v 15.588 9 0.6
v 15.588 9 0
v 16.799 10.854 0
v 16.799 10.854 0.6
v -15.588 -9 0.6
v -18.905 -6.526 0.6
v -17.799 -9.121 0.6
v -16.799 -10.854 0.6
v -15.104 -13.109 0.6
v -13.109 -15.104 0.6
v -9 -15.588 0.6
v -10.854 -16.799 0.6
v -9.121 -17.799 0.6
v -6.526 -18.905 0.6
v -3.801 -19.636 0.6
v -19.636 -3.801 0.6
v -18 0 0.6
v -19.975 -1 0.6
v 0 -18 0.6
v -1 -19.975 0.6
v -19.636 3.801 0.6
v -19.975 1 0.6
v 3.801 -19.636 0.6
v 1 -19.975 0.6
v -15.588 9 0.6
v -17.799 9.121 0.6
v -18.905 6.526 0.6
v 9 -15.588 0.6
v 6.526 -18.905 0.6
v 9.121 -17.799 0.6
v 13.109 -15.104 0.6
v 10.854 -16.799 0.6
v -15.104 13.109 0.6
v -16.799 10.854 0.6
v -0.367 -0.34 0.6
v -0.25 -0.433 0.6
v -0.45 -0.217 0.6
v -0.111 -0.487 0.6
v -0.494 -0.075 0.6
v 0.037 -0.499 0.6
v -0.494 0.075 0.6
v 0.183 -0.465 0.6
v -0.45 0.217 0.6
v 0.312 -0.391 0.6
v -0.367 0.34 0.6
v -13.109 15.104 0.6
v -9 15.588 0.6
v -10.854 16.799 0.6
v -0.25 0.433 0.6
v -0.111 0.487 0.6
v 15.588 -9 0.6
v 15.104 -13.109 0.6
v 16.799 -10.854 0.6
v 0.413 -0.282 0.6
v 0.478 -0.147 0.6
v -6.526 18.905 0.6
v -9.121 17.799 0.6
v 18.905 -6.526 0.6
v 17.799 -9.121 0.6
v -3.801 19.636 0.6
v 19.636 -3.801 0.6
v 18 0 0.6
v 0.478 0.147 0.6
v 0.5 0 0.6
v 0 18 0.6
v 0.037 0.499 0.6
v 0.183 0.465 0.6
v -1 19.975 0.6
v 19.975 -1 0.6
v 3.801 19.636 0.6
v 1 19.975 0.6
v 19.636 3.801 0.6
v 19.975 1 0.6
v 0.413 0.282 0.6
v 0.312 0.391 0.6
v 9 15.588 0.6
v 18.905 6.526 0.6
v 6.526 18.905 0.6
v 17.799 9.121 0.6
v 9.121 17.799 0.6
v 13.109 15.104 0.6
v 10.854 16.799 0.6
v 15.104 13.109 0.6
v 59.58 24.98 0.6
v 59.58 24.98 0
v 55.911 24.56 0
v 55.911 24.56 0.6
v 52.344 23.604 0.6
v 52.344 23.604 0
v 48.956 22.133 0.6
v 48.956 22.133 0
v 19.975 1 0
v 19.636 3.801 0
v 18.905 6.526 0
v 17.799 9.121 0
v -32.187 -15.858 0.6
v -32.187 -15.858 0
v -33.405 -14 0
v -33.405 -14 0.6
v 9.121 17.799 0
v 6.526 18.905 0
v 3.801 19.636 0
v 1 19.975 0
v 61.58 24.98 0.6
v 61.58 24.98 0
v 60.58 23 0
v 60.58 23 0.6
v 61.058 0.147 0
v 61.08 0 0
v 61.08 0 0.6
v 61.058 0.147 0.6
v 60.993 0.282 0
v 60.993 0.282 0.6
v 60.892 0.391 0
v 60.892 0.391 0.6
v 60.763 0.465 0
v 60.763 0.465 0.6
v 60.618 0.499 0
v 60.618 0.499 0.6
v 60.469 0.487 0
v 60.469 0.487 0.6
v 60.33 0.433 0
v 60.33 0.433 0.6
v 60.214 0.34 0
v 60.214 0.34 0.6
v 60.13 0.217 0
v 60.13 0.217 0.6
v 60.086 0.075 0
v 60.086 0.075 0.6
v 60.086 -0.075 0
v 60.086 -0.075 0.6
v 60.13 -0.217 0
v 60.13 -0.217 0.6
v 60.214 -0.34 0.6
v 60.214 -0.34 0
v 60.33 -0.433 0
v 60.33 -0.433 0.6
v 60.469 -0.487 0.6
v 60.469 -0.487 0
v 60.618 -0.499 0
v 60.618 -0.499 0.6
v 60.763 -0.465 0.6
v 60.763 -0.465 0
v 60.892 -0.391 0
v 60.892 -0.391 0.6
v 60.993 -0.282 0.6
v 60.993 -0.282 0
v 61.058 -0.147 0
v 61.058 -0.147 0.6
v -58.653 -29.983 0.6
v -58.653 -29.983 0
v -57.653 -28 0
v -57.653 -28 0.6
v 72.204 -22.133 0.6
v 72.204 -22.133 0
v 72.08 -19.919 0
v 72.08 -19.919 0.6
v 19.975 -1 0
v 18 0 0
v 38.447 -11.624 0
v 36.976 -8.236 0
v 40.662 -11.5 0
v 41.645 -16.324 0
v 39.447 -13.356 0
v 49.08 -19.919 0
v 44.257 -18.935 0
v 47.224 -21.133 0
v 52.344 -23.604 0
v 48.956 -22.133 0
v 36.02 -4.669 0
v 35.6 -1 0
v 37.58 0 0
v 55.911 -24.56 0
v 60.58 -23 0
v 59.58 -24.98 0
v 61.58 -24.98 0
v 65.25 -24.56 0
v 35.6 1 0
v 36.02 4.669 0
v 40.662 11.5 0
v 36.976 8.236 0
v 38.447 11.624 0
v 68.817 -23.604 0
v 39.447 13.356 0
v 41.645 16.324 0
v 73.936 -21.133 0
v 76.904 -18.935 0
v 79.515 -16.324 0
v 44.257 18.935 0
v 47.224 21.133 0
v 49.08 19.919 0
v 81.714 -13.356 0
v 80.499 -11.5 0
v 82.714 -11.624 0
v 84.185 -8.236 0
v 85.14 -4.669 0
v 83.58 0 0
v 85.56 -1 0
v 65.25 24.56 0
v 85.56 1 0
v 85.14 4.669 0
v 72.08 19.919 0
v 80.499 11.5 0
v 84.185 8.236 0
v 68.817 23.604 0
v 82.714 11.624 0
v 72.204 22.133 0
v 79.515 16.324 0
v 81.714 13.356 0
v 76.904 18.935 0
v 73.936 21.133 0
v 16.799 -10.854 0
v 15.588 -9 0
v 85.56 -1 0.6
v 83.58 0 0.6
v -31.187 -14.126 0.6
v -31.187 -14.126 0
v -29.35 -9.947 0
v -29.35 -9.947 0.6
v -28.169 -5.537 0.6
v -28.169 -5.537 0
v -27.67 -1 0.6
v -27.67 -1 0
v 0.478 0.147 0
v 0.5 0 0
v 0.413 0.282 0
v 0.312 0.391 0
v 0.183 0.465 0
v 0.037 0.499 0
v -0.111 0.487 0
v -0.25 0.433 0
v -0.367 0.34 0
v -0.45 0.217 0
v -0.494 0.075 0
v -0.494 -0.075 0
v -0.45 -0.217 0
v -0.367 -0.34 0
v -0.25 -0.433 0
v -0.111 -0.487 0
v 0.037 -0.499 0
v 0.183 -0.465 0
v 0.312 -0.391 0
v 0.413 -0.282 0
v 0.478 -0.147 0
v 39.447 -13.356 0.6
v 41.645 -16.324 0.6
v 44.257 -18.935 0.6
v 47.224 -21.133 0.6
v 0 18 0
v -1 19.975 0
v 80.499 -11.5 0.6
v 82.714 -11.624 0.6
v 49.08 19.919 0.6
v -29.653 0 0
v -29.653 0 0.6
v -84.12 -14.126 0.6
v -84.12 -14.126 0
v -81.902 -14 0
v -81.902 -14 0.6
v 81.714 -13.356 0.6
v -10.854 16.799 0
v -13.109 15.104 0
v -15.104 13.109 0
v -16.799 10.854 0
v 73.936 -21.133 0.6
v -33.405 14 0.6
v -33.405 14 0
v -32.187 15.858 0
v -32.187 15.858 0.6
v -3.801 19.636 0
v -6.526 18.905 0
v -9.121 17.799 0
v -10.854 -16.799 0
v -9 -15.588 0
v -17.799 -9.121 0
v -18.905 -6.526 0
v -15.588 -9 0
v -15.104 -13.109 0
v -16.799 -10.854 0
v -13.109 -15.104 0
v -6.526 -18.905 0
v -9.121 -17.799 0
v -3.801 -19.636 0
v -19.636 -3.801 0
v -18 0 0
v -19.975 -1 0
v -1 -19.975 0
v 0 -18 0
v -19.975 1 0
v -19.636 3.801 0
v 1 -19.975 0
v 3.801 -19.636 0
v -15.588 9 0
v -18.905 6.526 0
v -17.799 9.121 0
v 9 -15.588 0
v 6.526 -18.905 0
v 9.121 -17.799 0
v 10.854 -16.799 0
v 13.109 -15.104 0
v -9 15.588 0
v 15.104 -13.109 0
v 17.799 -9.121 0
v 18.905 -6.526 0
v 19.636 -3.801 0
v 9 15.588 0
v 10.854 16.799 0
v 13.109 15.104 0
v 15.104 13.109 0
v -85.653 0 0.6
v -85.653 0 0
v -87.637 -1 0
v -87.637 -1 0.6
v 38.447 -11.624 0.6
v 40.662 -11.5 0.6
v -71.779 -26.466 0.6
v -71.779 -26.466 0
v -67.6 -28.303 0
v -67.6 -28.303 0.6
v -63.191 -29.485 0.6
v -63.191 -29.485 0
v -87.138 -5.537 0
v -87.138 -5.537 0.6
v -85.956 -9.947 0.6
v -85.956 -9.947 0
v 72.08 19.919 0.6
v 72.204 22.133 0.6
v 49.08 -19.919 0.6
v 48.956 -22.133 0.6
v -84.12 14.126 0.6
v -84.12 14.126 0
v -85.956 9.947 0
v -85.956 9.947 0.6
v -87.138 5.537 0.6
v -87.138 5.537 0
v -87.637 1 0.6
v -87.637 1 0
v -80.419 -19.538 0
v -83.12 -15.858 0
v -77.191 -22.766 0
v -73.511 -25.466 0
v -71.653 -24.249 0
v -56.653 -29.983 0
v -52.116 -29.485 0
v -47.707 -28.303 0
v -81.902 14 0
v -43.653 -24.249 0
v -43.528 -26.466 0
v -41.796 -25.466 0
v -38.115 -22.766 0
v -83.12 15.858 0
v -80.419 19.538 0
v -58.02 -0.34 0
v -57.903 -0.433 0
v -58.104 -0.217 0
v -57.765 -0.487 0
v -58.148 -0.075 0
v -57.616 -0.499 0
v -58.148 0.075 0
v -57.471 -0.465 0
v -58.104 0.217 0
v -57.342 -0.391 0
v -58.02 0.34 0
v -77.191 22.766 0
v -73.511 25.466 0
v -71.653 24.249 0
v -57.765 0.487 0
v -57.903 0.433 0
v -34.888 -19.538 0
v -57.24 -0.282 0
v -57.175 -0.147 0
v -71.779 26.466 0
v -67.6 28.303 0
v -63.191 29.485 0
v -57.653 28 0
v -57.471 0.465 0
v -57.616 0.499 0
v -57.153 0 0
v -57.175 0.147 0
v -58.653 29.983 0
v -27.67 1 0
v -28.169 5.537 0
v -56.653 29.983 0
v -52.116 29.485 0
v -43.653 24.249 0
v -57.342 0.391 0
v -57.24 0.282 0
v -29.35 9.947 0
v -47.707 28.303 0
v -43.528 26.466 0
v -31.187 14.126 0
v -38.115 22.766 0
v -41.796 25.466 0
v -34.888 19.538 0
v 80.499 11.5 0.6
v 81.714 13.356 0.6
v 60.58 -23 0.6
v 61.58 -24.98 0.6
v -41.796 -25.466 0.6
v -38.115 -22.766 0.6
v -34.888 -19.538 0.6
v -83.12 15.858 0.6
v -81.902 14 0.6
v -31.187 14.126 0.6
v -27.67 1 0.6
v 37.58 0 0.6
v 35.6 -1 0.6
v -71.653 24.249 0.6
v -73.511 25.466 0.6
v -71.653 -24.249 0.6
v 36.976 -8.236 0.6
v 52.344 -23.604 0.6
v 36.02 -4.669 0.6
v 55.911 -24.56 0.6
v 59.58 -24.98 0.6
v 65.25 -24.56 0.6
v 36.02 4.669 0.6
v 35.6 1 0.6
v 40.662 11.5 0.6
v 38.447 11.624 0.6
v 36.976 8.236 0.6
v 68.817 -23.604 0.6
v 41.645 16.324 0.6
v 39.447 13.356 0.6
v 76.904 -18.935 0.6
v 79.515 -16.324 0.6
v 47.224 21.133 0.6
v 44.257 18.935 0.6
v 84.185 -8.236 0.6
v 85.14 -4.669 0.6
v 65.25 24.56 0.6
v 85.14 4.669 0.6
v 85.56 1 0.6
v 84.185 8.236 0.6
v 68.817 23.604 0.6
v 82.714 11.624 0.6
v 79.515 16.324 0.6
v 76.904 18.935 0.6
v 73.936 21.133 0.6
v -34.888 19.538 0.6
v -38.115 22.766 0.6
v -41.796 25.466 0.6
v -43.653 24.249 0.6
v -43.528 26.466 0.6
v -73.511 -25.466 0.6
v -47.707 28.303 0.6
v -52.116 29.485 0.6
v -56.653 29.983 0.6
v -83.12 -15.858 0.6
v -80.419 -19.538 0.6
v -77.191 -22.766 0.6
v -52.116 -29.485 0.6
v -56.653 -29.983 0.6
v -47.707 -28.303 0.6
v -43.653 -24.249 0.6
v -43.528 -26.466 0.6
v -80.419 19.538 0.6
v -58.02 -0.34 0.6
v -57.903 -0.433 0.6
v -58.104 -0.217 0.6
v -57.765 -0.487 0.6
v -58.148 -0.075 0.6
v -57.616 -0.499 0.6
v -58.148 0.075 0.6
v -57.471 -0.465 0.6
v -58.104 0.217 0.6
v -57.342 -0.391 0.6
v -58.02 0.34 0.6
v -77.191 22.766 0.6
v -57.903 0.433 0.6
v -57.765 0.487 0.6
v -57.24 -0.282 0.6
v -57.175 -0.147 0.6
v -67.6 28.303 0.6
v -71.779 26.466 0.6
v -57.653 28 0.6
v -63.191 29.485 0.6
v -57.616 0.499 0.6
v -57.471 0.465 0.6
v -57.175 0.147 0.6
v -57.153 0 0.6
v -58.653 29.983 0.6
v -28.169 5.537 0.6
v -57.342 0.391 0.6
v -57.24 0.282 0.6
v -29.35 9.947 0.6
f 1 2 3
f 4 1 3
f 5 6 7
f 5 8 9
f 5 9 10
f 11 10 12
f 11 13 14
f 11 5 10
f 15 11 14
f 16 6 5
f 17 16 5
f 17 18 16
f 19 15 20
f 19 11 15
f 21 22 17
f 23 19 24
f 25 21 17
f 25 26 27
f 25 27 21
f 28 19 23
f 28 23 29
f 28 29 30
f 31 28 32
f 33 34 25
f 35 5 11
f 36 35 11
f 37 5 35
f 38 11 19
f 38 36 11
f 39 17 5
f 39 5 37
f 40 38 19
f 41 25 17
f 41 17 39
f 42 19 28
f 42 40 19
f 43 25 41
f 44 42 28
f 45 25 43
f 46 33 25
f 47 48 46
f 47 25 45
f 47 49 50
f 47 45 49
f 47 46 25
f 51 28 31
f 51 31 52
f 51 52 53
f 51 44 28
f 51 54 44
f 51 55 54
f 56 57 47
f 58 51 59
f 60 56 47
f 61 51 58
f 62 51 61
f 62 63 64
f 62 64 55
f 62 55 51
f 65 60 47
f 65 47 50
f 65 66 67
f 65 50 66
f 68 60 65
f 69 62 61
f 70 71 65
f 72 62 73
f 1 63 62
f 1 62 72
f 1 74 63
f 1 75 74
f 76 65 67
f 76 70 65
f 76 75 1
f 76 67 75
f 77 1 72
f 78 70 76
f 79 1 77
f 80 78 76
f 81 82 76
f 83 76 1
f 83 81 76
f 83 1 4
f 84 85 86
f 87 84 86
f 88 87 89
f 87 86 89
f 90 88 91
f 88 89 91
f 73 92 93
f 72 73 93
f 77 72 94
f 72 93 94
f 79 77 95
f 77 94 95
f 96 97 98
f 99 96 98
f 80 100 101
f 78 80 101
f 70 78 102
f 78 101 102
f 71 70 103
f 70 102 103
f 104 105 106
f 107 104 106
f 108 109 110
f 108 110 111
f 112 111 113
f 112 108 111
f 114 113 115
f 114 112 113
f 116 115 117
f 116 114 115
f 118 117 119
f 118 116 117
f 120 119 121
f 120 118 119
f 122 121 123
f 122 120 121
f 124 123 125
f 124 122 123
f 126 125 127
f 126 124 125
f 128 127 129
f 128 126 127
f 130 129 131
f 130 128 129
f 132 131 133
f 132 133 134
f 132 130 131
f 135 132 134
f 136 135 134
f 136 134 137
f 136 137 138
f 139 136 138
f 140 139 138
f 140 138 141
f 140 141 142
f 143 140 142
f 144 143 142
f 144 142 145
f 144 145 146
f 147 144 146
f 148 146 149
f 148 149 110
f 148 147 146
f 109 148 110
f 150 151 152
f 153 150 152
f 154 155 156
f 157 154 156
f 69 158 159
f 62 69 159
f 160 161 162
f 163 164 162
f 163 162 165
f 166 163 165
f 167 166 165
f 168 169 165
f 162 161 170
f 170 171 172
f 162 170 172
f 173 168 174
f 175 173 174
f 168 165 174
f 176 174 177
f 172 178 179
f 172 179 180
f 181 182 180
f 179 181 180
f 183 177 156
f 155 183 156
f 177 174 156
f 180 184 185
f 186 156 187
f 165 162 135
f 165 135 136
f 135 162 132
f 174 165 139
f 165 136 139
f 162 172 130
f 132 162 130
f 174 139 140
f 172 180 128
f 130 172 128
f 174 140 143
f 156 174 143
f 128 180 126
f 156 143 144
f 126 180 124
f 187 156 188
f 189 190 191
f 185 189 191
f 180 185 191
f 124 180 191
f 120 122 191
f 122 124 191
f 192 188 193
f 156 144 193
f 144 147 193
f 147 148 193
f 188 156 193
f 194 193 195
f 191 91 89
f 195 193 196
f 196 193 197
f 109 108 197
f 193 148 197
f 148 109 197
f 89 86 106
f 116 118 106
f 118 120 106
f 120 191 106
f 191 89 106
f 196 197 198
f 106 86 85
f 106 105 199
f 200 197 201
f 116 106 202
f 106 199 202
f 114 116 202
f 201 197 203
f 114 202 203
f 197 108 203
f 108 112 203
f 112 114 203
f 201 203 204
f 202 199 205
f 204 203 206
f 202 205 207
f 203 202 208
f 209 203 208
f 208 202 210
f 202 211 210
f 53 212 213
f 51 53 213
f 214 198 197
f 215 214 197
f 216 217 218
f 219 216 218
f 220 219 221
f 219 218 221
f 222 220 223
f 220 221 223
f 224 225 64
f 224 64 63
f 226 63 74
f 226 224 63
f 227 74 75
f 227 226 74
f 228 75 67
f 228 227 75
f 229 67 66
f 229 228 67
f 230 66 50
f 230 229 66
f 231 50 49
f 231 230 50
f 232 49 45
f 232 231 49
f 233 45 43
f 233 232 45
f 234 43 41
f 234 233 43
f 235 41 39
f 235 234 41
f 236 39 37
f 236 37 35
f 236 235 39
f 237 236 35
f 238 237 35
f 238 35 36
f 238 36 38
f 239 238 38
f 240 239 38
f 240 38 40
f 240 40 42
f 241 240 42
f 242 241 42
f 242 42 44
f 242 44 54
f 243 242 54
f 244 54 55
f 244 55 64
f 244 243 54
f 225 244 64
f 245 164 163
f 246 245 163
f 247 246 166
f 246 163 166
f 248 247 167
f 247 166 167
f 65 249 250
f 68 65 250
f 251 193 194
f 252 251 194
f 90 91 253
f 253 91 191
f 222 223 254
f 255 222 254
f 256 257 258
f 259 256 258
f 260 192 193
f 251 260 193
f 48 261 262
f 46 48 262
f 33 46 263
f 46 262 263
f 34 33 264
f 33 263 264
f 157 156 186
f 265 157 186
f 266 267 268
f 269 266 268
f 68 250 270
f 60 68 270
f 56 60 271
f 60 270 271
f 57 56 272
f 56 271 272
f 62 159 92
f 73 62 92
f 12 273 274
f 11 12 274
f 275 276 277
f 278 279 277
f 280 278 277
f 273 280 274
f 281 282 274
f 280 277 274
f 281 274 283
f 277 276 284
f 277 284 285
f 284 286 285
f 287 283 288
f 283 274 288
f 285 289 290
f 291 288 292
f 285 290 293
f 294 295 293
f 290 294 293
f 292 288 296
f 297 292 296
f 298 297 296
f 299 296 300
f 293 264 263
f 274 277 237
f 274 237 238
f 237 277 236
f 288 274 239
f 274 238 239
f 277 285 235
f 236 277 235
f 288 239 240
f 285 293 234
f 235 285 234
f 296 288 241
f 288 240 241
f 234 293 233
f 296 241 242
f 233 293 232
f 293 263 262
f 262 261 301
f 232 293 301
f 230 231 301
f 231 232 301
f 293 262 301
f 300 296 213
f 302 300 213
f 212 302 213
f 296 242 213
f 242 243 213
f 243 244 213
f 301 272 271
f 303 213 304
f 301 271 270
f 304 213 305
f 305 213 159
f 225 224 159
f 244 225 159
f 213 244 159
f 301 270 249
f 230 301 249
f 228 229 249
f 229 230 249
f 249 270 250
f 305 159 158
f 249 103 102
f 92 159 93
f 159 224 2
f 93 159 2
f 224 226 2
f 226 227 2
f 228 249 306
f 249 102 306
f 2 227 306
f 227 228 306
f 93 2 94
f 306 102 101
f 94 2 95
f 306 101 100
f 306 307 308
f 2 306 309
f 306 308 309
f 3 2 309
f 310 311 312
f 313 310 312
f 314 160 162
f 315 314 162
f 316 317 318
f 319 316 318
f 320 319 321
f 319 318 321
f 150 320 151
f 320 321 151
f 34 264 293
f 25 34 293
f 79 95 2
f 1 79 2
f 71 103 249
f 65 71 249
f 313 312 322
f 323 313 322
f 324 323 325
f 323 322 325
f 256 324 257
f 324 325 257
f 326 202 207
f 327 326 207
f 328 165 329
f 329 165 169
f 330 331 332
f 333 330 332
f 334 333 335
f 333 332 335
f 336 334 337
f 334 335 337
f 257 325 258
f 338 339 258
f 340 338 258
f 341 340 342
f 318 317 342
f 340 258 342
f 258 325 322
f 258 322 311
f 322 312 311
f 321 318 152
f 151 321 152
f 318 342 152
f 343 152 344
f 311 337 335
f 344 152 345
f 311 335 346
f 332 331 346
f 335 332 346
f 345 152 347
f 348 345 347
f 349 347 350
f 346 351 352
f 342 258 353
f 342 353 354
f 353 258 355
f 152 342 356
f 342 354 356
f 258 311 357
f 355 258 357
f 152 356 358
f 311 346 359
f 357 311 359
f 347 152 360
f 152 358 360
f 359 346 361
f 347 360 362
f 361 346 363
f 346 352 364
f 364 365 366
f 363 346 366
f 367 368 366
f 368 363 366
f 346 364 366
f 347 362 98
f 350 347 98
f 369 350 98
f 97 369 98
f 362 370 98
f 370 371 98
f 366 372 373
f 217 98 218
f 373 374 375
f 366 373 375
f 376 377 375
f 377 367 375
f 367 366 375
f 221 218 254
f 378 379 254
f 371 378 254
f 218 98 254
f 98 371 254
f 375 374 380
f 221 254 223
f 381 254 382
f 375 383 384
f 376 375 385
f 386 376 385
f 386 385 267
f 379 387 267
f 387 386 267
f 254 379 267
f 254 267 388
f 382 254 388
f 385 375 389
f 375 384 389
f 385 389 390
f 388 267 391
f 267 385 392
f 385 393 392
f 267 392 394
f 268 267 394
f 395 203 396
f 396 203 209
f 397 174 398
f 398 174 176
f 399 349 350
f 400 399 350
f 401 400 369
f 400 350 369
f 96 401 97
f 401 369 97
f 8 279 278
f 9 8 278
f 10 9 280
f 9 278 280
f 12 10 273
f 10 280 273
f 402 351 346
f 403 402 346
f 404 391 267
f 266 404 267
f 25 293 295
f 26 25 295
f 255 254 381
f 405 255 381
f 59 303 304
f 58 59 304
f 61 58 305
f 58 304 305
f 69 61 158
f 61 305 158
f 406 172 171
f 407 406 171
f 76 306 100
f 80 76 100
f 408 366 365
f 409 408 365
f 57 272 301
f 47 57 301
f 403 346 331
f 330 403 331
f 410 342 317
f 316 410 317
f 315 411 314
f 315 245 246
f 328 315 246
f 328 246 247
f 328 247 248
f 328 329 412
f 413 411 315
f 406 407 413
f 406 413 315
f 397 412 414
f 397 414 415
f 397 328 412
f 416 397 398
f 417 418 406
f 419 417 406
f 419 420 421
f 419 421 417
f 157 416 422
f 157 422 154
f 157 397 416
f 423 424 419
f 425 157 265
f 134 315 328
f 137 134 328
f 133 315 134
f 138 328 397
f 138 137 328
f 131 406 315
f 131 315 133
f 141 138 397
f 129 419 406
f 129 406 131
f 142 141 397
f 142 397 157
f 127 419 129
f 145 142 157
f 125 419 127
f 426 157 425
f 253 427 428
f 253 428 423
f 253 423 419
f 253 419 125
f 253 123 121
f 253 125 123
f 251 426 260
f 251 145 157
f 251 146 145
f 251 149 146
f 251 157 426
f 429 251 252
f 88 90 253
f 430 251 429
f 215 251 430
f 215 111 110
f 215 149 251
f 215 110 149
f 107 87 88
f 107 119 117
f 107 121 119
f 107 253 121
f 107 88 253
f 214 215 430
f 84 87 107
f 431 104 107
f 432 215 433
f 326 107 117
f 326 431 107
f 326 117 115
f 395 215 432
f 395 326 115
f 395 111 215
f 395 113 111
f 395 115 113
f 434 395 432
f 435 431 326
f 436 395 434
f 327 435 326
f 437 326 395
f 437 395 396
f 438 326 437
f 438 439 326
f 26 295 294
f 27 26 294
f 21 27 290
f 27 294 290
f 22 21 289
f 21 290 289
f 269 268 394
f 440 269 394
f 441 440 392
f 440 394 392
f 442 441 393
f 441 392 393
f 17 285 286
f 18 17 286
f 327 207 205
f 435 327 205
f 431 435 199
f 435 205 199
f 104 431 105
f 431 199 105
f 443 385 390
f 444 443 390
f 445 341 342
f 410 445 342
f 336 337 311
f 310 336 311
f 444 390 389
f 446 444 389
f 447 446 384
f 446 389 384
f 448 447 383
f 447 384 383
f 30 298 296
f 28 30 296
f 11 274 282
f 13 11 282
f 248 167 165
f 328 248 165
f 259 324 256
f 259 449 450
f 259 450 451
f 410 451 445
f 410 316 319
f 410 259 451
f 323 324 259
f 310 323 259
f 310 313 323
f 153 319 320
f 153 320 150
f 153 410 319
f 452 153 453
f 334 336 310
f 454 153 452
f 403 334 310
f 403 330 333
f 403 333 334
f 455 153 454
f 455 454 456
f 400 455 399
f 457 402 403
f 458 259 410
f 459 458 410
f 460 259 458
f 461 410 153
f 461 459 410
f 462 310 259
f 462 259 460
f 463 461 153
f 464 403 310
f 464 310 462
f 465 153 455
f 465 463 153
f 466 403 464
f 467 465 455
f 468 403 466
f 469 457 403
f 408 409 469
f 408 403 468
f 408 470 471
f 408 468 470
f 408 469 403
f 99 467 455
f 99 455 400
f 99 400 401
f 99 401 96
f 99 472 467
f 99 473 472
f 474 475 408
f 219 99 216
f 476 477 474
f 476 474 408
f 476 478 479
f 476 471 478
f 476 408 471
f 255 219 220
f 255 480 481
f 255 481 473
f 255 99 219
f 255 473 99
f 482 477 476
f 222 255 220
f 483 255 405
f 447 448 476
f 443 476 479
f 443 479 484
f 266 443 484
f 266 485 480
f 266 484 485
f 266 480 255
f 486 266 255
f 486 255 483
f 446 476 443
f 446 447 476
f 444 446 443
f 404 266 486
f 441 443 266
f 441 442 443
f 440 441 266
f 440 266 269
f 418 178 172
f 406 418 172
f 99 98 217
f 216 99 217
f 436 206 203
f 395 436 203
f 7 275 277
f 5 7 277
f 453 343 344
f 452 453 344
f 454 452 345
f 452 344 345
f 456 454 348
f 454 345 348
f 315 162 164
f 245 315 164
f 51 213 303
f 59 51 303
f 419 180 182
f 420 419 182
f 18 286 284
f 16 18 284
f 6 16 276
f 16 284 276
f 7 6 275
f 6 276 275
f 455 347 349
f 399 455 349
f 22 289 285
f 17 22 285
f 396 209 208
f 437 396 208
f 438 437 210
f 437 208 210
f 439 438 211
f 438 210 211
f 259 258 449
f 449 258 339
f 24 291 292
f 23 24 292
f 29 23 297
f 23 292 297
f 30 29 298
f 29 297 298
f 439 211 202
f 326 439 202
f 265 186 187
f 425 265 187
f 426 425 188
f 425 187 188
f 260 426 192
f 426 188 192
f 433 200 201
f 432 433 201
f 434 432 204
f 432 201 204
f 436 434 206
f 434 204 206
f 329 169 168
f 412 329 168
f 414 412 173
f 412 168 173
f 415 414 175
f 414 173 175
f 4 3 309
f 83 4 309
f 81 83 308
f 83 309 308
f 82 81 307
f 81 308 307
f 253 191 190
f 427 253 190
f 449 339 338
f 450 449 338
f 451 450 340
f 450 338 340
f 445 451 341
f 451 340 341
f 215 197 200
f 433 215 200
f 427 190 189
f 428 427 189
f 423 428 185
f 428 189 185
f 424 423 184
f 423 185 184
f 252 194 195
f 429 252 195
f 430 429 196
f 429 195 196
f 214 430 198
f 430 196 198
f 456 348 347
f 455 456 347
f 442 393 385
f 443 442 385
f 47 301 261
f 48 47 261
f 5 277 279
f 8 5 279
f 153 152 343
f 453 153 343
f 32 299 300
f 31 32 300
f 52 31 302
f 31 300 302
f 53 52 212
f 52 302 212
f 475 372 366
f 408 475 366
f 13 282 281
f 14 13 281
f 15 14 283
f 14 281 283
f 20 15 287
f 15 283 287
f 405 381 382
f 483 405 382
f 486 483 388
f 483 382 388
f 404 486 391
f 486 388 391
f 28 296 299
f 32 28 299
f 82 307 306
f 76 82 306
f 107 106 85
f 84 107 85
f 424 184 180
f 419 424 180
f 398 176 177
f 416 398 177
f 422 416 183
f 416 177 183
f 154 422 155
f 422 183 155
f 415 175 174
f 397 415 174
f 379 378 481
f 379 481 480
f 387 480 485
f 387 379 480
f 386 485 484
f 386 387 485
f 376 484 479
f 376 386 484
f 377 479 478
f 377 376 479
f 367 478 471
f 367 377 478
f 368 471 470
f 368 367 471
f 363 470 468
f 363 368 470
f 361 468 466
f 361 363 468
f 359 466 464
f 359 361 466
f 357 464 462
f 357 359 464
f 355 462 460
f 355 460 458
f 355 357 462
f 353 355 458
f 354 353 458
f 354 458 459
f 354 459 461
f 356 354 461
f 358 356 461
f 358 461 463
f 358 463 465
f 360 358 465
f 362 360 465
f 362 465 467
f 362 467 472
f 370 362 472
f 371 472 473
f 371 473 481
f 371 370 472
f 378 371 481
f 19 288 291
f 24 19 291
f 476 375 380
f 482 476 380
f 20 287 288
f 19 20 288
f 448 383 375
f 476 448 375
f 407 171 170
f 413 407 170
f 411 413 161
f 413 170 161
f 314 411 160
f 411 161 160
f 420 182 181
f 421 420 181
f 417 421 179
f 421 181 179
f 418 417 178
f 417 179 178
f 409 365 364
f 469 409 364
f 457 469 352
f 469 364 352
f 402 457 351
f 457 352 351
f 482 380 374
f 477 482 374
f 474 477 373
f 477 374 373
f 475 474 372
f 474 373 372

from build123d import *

# Parameters (mm, degrees)
F0_R     = 0.5
F1_DEPTH = 0.6


with BuildPart() as f1:
    # F0 (on Top) → F1 (new body)
    with BuildSketch(Plane.XY):
        with BuildLine():
            Line((72.080339, 19.918584), (72.20431, 22.133308))
            ThreePointArc((72.20431, 22.133308), (67.050815, 24.148146), (61.580339, 24.979992))
            Line((61.580339, 24.979992), (60.580339, 23))
            Line((60.580339, 23), (59.580339, 24.979992))
            ThreePointArc((59.580339, 24.979992), (54.109863, 24.148146), (48.956369, 22.133308))
            Line((48.956369, 22.133308), (49.080339, 19.918584))
            Line((49.080339, 19.918584), (47.224318, 21.133308))
            ThreePointArc((47.224318, 21.133308), (42.90267, 17.67767), (39.447032, 13.356021))
            Line((39.447032, 13.356021), (40.661755, 11.5))
            Line((40.661755, 11.5), (38.447032, 11.623971))
            ThreePointArc((38.447032, 11.623971), (36.432194, 6.470476), (35.600347, 1))
            Line((35.600347, 1), (37.580339, 0))
            Line((37.580339, 0), (35.600347, -1))
            ThreePointArc((35.600347, -1), (36.432194, -6.470476), (38.447032, -11.623971))
            Line((38.447032, -11.623971), (40.661755, -11.5))
            Line((40.661755, -11.5), (39.447032, -13.356021))
            ThreePointArc((39.447032, -13.356021), (42.90267, -17.67767), (47.224318, -21.133308))
            Line((47.224318, -21.133308), (49.080339, -19.918584))
            Line((49.080339, -19.918584), (48.956369, -22.133308))
            ThreePointArc((48.956369, -22.133308), (54.109863, -24.148146), (59.580339, -24.979992))
            Line((59.580339, -24.979992), (60.580339, -23))
            Line((60.580339, -23), (61.580339, -24.979992))
            ThreePointArc((61.580339, -24.979992), (67.050815, -24.148146), (72.20431, -22.133308))
            Line((72.20431, -22.133308), (72.080339, -19.918584))
            Line((72.080339, -19.918584), (73.936361, -21.133308))
            ThreePointArc((73.936361, -21.133308), (78.258009, -17.67767), (81.713647, -13.356021))
            Line((81.713647, -13.356021), (80.498924, -11.5))
            Line((80.498924, -11.5), (82.713647, -11.623971))
            ThreePointArc((82.713647, -11.623971), (84.728485, -6.470476), (85.560331, -1))
            Line((85.560331, -1), (83.580339, 0))
            Line((83.580339, 0), (85.560331, 1))
            ThreePointArc((85.560331, 1), (84.728485, 6.470476), (82.713647, 11.623971))
            Line((82.713647, 11.623971), (80.498924, 11.5))
            Line((80.498924, 11.5), (81.713647, 13.356021))
            ThreePointArc((81.713647, 13.356021), (78.258009, 17.67767), (73.936361, 21.133308))
            Line((73.936361, 21.133308), (72.080339, 19.918584))
        make_face()
        with Locations((60.580339, 0)):
            Circle(F0_R, mode=Mode.SUBTRACT)
        with BuildLine():
            Line((9, 15.588457), (9.121467, 17.798844))
            ThreePointArc((9.121467, 17.798844), (5.176381, 19.318517), (1, 19.974984))
            Line((1, 19.974984), (0, 18))
            Line((0, 18), (-1, 19.974984))
            ThreePointArc((-1, 19.974984), (-5.176381, 19.318517), (-9.121467, 17.798844))
            Line((-9.121467, 17.798844), (-9, 15.588457))
            Line((-9, 15.588457), (-10.853518, 16.798844))
            ThreePointArc((-10.853518, 16.798844), (-14.142136, 14.142136), (-16.798844, 10.853518))
            Line((-16.798844, 10.853518), (-15.588457, 9))
            Line((-15.588457, 9), (-17.798844, 9.121467))
            ThreePointArc((-17.798844, 9.121467), (-19.318517, 5.176381), (-19.974984, 1))
            Line((-19.974984, 1), (-18, 0))
            Line((-18, 0), (-19.974984, -1))
            ThreePointArc((-19.974984, -1), (-19.318517, -5.176381), (-17.798844, -9.121467))
            Line((-17.798844, -9.121467), (-15.588457, -9))
            Line((-15.588457, -9), (-16.798844, -10.853518))
            ThreePointArc((-16.798844, -10.853518), (-14.142136, -14.142136), (-10.853518, -16.798844))
            Line((-10.853518, -16.798844), (-9, -15.588457))
            Line((-9, -15.588457), (-9.121467, -17.798844))
            ThreePointArc((-9.121467, -17.798844), (-5.176381, -19.318517), (-1, -19.974984))
            Line((-1, -19.974984), (0, -18))
            Line((0, -18), (1, -19.974984))
            ThreePointArc((1, -19.974984), (5.176381, -19.318517), (9.121467, -17.798844))
            Line((9.121467, -17.798844), (9, -15.588457))
            Line((9, -15.588457), (10.853518, -16.798844))
            ThreePointArc((10.853518, -16.798844), (14.142136, -14.142136), (16.798844, -10.853518))
            Line((16.798844, -10.853518), (15.588457, -9))
            Line((15.588457, -9), (17.798844, -9.121467))
            ThreePointArc((17.798844, -9.121467), (19.318517, -5.176381), (19.974984, -1))
            Line((19.974984, -1), (18, 0))
            Line((18, 0), (19.974984, 1))
            ThreePointArc((19.974984, 1), (19.318517, 5.176381), (17.798844, 9.121467))
            Line((17.798844, 9.121467), (15.588457, 9))
            Line((15.588457, 9), (16.798844, 10.853518))
            ThreePointArc((16.798844, 10.853518), (14.142136, 14.142136), (10.853518, 16.798844))
            Line((10.853518, 16.798844), (9, 15.588457))
        make_face()
        Circle(F0_R, mode=Mode.SUBTRACT)
        with BuildLine():
            Line((-43.653245, 24.248711), (-43.527606, 26.466324))
            ThreePointArc((-43.527606, 26.466324), (-49.888673, 28.977775), (-56.653245, 29.983329))
            Line((-56.653245, 29.983329), (-57.653245, 28))
            Line((-57.653245, 28), (-58.653245, 29.983329))
            ThreePointArc((-58.653245, 29.983329), (-65.417816, 28.977775), (-71.778884, 26.466324))
            Line((-71.778884, 26.466324), (-71.653245, 24.248711))
            Line((-71.653245, 24.248711), (-73.510934, 25.466324))
            ThreePointArc((-73.510934, 25.466324), (-78.866448, 21.213203), (-83.119569, 15.85769))
            Line((-83.119569, 15.85769), (-81.901956, 14))
            Line((-81.901956, 14), (-84.119569, 14.125639))
            ThreePointArc((-84.119569, 14.125639), (-86.631019, 7.764571), (-87.636573, 1))
            Line((-87.636573, 1), (-85.653245, 0))
            Line((-85.653245, 0), (-87.636573, -1))
            ThreePointArc((-87.636573, -1), (-86.631019, -7.764571), (-84.119569, -14.125639))
            Line((-84.119569, -14.125639), (-81.901956, -14))
            Line((-81.901956, -14), (-83.119569, -15.85769))
            ThreePointArc((-83.119569, -15.85769), (-78.866448, -21.213203), (-73.510934, -25.466324))
            Line((-73.510934, -25.466324), (-71.653245, -24.248711))
            Line((-71.653245, -24.248711), (-71.778884, -26.466324))
            ThreePointArc((-71.778884, -26.466324), (-65.417816, -28.977775), (-58.653245, -29.983329))
            Line((-58.653245, -29.983329), (-57.653245, -28))
            Line((-57.653245, -28), (-56.653245, -29.983329))
            ThreePointArc((-56.653245, -29.983329), (-49.888673, -28.977775), (-43.527606, -26.466324))
            Line((-43.527606, -26.466324), (-43.653245, -24.248711))
            Line((-43.653245, -24.248711), (-41.795555, -25.466324))
            ThreePointArc((-41.795555, -25.466324), (-36.440041, -21.213203), (-32.18692, -15.85769))
            Line((-32.18692, -15.85769), (-33.404533, -14))
            Line((-33.404533, -14), (-31.18692, -14.125639))
            ThreePointArc((-31.18692, -14.125639), (-28.67547, -7.764571), (-27.669916, -1))
            Line((-27.669916, -1), (-29.653245, 0))
            Line((-29.653245, 0), (-27.669916, 1))
            ThreePointArc((-27.669916, 1), (-28.67547, 7.764571), (-31.18692, 14.125639))
            Line((-31.18692, 14.125639), (-33.404533, 14))
            Line((-33.404533, 14), (-32.18692, 15.85769))
            ThreePointArc((-32.18692, 15.85769), (-36.440041, 21.213203), (-41.795555, 25.466324))
            Line((-41.795555, 25.466324), (-43.653245, 24.248711))
        make_face()
        with Locations((-57.653245, 0)):
            Circle(F0_R, mode=Mode.SUBTRACT)
    extrude(amount=F1_DEPTH)


solid = f1.part
